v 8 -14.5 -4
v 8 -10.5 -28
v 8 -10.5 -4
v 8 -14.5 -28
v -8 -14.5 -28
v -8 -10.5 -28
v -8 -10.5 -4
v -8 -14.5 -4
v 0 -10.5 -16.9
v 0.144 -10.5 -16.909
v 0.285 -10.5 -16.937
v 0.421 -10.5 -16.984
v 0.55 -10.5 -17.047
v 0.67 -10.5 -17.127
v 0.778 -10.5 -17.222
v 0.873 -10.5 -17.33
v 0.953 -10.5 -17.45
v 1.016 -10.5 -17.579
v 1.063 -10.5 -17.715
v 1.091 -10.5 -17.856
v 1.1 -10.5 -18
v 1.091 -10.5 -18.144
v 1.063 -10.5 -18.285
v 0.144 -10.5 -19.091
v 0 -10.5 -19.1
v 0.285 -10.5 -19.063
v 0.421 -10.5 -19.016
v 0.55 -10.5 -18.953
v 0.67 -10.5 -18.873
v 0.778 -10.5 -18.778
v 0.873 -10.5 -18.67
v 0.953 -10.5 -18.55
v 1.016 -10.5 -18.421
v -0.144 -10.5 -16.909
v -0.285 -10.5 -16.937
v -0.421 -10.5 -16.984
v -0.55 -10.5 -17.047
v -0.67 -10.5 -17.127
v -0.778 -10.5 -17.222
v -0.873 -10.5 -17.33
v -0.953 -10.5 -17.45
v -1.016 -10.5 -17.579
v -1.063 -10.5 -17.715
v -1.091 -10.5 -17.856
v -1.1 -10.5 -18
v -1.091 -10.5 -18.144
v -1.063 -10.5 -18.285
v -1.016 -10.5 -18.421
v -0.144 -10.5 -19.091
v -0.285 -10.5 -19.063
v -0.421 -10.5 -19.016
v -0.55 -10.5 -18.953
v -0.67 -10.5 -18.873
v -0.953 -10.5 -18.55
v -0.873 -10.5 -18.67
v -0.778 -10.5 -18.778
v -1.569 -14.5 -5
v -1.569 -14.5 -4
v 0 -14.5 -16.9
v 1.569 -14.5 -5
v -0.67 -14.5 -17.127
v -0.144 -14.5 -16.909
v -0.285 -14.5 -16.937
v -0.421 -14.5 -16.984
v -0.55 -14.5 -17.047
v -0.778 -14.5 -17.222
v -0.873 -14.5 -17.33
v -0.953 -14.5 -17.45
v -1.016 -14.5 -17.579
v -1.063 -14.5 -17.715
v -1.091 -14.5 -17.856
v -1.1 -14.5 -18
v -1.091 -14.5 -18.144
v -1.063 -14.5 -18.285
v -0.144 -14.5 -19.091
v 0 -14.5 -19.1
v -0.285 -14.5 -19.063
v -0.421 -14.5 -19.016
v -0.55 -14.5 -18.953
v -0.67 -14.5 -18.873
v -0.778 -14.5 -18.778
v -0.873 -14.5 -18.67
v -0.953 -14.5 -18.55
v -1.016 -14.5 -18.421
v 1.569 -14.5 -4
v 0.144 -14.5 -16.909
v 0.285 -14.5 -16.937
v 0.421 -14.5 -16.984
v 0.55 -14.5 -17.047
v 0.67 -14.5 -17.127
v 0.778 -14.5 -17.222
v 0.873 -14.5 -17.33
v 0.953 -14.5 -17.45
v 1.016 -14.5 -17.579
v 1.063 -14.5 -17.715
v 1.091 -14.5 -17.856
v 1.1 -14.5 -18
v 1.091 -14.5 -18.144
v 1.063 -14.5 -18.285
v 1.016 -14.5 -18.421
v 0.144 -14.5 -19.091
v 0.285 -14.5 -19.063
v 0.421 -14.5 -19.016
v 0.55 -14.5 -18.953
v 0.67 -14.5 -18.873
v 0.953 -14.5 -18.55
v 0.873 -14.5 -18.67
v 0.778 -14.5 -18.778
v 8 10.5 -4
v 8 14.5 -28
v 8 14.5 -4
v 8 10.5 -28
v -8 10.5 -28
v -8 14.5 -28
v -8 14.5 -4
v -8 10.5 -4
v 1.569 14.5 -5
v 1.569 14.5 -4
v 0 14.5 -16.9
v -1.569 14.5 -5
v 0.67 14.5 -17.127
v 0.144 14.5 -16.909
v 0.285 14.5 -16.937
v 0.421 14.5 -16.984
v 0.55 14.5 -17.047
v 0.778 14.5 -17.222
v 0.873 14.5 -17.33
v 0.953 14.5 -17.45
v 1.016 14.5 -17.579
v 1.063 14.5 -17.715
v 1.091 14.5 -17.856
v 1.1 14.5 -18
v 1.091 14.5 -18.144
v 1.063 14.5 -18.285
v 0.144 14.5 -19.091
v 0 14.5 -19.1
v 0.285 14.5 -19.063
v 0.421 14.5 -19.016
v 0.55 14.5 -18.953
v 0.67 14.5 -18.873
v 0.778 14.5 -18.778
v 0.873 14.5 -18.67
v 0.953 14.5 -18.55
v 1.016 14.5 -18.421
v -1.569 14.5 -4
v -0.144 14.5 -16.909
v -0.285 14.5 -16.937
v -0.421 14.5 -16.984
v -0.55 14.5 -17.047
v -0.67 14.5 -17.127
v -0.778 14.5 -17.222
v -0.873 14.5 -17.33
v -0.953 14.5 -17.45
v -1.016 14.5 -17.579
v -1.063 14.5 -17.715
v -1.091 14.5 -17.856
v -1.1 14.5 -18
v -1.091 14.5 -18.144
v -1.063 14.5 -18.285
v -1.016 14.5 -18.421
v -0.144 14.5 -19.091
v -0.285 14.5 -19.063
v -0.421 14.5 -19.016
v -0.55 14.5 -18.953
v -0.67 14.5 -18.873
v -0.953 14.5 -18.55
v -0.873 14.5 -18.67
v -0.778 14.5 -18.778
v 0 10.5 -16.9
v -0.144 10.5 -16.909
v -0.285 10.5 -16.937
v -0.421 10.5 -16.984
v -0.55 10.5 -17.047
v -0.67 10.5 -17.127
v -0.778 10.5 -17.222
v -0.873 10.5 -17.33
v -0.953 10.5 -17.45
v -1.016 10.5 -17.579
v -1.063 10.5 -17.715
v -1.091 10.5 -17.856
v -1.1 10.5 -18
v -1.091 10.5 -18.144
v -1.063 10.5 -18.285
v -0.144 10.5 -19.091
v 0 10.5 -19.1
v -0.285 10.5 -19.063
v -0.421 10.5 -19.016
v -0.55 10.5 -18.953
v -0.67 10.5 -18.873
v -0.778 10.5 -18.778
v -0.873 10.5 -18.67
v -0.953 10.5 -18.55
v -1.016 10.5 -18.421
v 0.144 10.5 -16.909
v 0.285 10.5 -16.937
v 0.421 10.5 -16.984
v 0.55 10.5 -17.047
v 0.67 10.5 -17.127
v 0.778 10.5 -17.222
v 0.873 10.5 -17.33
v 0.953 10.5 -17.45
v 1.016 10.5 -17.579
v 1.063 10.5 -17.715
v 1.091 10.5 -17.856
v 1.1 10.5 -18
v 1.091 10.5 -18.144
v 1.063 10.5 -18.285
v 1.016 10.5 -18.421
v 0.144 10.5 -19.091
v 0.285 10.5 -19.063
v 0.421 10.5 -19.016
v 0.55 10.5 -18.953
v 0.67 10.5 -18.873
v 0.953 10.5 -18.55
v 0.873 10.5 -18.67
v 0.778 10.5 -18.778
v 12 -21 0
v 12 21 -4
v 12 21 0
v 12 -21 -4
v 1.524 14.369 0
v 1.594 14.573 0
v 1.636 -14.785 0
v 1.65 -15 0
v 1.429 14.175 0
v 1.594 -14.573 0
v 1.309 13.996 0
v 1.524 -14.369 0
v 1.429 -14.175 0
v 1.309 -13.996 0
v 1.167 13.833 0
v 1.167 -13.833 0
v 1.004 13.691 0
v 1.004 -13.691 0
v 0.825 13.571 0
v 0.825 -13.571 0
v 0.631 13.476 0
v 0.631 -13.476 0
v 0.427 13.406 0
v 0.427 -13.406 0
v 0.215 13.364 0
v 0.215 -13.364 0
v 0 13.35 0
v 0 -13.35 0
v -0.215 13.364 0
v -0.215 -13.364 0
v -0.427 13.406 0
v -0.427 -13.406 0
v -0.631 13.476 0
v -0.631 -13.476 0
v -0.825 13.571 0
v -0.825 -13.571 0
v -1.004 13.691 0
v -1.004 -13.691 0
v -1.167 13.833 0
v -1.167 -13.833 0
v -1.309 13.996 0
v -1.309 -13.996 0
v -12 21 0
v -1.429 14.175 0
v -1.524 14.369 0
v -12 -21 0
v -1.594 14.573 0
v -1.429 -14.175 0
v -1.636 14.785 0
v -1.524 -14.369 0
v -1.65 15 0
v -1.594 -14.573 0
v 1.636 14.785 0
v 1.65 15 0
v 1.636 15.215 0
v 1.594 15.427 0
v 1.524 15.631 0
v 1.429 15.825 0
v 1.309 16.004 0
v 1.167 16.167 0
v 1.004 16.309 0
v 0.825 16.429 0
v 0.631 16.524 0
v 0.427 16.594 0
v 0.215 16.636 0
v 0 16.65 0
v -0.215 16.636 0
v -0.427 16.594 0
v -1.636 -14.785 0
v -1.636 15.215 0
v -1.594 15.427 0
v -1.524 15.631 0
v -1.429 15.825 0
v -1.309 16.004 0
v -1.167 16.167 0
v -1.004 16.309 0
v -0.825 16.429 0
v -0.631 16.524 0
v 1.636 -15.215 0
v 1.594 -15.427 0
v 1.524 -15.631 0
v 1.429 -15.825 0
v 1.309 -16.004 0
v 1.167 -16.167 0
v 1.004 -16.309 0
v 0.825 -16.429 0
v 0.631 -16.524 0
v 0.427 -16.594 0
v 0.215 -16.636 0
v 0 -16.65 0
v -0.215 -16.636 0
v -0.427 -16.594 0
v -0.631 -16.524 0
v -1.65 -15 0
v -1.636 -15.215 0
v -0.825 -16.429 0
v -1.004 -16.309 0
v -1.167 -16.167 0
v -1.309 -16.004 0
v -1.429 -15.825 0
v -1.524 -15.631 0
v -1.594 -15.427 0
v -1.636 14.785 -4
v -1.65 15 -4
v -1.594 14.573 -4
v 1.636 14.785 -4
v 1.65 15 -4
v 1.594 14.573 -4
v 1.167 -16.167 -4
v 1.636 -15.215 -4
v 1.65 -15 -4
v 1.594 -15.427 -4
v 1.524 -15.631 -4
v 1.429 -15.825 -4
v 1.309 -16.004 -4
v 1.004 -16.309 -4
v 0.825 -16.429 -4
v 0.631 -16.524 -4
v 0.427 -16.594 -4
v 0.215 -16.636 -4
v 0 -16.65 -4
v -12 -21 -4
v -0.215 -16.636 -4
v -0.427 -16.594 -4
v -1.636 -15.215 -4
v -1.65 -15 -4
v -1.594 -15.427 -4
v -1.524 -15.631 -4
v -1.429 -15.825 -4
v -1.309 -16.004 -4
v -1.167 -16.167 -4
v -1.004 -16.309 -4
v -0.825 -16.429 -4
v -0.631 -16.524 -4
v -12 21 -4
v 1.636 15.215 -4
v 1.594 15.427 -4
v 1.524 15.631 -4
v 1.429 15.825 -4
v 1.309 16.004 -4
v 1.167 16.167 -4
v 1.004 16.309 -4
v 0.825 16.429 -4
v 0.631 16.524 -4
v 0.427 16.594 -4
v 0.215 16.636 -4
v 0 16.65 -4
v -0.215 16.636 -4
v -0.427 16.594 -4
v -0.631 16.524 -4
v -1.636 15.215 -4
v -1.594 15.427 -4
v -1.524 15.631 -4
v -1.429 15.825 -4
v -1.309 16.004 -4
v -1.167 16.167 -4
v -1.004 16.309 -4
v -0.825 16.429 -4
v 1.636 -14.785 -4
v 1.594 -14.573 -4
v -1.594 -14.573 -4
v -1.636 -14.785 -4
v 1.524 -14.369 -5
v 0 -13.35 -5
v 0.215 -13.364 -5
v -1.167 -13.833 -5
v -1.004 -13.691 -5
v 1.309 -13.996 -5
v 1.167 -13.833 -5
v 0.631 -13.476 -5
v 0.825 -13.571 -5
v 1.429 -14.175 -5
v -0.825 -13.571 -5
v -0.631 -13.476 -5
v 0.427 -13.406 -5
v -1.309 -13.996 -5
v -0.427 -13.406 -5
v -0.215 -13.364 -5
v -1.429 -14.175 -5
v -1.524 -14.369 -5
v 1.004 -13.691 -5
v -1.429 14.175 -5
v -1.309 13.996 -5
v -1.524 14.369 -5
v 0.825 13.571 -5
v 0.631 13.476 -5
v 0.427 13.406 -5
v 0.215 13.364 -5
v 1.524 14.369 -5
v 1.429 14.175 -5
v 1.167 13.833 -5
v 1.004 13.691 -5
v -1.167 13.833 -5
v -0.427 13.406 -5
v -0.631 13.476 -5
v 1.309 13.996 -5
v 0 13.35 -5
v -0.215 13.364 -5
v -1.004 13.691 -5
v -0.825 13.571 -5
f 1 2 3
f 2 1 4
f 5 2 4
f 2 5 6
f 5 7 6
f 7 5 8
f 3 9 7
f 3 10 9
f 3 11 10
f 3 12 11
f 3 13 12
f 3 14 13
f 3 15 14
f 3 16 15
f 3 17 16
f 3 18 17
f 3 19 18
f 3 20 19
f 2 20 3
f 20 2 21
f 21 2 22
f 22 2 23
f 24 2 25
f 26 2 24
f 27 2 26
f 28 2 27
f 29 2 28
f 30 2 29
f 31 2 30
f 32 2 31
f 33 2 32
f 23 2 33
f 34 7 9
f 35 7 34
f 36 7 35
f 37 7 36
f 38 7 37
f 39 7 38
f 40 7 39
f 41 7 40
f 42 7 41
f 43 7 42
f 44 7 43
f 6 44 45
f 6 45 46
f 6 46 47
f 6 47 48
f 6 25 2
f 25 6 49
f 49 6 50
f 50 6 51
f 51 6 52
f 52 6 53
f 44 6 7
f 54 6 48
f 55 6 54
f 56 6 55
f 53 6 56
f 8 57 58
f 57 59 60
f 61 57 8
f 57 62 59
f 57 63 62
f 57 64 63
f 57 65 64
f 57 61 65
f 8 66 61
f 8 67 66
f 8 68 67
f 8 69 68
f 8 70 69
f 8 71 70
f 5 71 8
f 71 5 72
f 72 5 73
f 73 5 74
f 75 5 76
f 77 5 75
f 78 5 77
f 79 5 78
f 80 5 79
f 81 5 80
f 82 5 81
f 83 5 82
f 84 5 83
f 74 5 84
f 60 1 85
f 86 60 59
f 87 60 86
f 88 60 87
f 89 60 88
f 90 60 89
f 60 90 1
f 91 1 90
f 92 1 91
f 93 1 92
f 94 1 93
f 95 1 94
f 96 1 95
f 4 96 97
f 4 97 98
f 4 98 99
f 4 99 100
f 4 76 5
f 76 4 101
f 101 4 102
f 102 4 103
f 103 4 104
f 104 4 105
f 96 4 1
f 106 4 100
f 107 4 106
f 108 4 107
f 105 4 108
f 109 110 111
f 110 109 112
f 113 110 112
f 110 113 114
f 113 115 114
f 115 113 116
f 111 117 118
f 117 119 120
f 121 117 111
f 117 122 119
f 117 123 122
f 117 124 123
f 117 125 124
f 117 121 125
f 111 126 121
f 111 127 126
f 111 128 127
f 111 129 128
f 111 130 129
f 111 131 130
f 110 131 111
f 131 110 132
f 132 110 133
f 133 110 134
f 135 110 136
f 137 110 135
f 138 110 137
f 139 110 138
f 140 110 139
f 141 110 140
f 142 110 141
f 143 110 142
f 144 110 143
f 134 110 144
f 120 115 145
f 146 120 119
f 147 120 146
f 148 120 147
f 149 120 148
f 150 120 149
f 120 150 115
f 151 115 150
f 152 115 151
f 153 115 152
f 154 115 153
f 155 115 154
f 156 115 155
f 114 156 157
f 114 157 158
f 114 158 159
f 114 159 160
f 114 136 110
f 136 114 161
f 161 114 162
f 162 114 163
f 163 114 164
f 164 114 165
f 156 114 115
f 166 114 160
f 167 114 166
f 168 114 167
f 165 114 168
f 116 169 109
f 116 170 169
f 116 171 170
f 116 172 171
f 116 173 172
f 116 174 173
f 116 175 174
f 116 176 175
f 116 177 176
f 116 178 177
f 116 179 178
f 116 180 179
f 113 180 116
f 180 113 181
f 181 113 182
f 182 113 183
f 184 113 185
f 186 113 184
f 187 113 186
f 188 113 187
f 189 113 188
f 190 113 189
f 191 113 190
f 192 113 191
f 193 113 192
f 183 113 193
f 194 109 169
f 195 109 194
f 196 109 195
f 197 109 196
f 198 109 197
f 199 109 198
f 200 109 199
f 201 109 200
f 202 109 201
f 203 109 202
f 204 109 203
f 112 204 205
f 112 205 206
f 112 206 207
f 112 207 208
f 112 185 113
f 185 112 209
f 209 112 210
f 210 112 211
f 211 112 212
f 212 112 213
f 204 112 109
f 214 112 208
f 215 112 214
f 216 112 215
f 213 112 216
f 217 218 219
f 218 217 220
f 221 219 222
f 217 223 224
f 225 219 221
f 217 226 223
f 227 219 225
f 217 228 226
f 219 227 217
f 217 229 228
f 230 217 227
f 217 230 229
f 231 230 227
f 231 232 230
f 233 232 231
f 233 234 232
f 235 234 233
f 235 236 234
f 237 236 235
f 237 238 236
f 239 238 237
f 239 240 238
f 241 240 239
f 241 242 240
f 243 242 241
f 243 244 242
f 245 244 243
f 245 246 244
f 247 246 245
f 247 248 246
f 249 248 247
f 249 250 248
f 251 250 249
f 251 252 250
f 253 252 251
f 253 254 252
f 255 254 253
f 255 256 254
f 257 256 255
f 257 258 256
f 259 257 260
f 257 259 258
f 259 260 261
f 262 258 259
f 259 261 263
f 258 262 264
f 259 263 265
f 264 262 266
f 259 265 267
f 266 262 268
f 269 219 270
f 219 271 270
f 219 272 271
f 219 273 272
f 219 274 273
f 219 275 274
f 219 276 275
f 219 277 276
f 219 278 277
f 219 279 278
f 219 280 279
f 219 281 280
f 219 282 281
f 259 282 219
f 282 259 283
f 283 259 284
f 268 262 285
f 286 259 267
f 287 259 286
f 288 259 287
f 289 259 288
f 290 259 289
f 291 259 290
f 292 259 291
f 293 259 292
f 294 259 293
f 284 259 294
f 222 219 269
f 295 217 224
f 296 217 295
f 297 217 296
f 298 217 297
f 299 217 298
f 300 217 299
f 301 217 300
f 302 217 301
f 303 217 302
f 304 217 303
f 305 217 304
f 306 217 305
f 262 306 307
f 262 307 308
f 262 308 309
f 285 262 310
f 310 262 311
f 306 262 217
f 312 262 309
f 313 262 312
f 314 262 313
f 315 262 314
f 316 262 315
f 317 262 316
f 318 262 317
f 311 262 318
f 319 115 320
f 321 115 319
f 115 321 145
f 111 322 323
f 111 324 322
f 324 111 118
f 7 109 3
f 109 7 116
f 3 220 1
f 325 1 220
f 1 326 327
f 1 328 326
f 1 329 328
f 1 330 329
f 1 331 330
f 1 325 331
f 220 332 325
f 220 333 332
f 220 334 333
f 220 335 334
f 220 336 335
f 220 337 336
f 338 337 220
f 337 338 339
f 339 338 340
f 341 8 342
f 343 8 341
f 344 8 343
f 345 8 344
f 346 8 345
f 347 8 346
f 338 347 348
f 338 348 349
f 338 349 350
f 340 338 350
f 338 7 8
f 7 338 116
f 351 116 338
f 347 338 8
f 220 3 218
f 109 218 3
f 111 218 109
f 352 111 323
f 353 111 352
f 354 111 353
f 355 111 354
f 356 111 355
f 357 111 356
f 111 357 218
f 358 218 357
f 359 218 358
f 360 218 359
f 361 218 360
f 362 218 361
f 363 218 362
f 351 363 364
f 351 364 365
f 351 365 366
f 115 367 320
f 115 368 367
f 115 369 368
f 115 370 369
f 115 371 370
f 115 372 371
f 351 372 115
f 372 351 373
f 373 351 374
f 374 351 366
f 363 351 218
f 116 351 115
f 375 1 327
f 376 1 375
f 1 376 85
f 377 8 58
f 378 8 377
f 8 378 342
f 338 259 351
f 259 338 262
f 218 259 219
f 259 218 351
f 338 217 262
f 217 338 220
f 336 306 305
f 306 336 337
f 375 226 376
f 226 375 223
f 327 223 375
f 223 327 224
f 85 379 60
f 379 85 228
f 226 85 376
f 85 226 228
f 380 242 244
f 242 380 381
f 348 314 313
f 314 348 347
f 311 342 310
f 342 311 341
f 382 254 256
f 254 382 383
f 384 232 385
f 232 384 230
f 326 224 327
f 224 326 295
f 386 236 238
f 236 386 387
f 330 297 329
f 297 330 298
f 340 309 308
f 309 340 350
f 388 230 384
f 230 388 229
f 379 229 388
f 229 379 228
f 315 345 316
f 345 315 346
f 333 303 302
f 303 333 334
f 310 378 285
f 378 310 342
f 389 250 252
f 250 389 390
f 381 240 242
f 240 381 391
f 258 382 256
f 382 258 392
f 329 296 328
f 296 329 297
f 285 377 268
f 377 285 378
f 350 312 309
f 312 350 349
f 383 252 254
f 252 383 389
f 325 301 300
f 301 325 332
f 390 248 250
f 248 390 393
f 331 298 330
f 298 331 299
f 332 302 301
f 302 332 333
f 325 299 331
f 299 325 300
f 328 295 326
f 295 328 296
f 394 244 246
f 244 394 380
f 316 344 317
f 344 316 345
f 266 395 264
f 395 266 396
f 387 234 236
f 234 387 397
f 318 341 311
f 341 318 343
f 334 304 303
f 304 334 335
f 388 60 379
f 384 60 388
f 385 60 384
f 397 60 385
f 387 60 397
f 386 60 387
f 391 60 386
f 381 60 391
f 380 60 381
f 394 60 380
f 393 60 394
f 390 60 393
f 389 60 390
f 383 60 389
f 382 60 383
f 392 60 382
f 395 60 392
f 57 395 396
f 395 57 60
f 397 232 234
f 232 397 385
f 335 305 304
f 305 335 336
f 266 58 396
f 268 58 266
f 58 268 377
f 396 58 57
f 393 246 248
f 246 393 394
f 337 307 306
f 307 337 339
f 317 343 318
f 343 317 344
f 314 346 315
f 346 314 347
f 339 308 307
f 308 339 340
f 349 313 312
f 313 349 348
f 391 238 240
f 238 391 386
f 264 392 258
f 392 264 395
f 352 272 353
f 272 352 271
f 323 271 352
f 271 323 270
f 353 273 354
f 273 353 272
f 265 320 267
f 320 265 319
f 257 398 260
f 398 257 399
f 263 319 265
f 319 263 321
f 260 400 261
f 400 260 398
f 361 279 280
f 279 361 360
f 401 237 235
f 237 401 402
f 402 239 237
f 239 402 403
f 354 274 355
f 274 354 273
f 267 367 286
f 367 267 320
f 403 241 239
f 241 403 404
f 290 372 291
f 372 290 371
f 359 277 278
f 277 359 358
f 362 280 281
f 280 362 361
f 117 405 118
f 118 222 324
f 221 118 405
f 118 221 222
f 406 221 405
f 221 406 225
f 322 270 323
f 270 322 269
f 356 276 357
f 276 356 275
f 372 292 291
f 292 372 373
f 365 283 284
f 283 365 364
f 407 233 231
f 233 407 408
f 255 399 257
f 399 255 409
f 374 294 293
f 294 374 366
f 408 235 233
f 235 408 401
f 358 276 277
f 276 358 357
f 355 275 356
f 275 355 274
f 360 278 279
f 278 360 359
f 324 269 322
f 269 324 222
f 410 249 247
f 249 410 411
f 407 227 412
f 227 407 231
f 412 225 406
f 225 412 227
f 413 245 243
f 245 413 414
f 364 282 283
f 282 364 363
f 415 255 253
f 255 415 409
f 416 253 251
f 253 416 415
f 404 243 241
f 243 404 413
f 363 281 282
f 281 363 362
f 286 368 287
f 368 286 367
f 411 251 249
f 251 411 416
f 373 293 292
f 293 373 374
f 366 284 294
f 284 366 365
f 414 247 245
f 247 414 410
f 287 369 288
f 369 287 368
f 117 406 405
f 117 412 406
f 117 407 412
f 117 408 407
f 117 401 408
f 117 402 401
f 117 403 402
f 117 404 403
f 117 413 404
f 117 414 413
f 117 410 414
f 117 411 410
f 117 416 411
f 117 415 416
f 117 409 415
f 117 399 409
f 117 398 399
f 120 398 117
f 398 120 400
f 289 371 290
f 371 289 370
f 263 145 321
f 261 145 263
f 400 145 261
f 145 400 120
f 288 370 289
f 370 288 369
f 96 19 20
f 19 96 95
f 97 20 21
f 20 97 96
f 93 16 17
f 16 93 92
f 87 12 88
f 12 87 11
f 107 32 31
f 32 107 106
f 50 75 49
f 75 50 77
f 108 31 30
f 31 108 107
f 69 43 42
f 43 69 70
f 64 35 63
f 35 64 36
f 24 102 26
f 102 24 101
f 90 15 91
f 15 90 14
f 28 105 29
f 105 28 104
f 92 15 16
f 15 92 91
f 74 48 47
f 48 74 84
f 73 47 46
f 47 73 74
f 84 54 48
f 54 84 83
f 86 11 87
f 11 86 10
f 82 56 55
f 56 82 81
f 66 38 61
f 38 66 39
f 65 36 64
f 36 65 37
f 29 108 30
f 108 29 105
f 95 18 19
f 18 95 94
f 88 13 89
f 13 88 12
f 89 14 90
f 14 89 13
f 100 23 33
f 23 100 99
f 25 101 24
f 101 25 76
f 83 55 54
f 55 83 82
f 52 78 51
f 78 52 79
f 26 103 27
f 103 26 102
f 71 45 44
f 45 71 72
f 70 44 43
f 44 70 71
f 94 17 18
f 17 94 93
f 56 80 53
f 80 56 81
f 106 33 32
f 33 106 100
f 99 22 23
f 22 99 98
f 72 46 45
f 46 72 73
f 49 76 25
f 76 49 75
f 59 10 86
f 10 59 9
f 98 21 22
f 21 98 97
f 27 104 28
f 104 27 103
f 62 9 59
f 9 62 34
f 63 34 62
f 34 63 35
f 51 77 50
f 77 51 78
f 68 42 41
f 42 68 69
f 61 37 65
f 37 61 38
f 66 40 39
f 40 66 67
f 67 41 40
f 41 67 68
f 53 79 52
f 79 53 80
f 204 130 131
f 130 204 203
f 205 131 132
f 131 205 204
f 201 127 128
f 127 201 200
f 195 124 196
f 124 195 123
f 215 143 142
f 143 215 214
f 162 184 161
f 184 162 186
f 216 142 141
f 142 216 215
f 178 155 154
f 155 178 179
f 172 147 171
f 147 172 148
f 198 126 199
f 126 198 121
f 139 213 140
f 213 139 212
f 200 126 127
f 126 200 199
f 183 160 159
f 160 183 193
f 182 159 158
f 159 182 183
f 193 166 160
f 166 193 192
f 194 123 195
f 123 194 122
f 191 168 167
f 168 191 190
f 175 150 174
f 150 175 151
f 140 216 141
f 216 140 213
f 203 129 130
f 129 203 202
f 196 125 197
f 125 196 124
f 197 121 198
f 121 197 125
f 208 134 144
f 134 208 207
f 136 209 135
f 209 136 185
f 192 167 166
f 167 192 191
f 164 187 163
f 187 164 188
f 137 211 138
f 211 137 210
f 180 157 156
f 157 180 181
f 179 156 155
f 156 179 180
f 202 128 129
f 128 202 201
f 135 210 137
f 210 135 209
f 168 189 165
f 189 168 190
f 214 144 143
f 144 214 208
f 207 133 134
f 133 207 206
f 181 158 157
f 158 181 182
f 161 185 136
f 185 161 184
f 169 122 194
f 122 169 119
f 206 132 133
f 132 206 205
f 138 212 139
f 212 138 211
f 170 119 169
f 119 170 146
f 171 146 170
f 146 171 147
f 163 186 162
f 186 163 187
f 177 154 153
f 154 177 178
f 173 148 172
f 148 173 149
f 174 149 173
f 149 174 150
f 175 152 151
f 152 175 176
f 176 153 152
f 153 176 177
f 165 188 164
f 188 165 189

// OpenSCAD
// file: ../common/ds_lib.scad
// DronSwarm · librería común de piezas del frame (S07-S08). Unidades: mm.
//
// Reglas (ADR-003): sin hull()/minkowski()/offset() — FreeCAD los convierte en malla y el STEP deja de ser un
// sólido válido. Las formas redondeadas se arman con uniones de cubos y cilindros. El importador CSG de FreeCAD
// también falla con booleanas 2D y con varios operandos agrupados bajo una sola transformación: cada grupo de
// agujeros debe ser hijo directo del difference(), con su propio translate.
//
// Interfaz de motor DronSwarm (DMI, ADR-011): placa con 4 ranuras radiales a 90°, de modo que el mismo soporte
// acepta varios patrones comerciales y, más adelante, el motor propio (S17+) se diseña para caer en el mismo rango.
//   DMI-S: 4×M3, círculo de tornillos Ø16-Ø25 (motores 28xx-41xx, ≤ 600 W)
//   DMI-L: 4×M4, círculo de tornillos Ø30-Ø42 (motores 50xx-70xx, ≤ 2 kW)

$fn = 48;

M3 = 3.3; M3_HEAD = 6.0; M3_NUT = 6.4;     // pasante, cabeza, tuerca (entre caras + juego)
M4 = 4.4; M4_HEAD = 7.5;
M5 = 5.4;

function dmi_bolt(iface) = iface == "L" ? M4 : M3;
function dmi_r(iface) = iface == "L" ? [15, 21] : [8, 12.5];   // radio mínimo y máximo de las ranuras
function dmi_plate_d(iface) = iface == "L" ? 56 : 36;
function dmi_center(iface) = iface == "L" ? 16 : 10;            // eje, seguro y paso de cables

// Rectángulo con esquinas redondeadas (2D) y su extrusión
module rrect2d(size, r) {
    r2 = min(r, size[0] / 2 - 0.01, size[1] / 2 - 0.01);
    union() {
        translate([r2, 0]) square([size[0] - 2 * r2, size[1]]);
        translate([0, r2]) square([size[0], size[1] - 2 * r2]);
        for (x = [r2, size[0] - r2], y = [r2, size[1] - r2]) translate([x, y]) circle(r = r2);
    }
}
// Caja redondeada con primitivas 3D (sin booleanas 2D: el importador CSG de FreeCAD falla con ellas)
module rbox(size, r) {
    r2 = min(r, size[0] / 2 - 0.01, size[1] / 2 - 0.01);
    union() {
        translate([r2, 0, 0]) cube([size[0] - 2 * r2, size[1], size[2]]);
        translate([0, r2, 0]) cube([size[0], size[1] - 2 * r2, size[2]]);
        for (x = [r2, size[0] - r2], y = [r2, size[1] - r2]) translate([x, y, 0]) cylinder(r = r2, h = size[2]);
    }
}
module crbox(size, r) { translate([-size[0] / 2, -size[1] / 2, 0]) rbox(size, r); }   // centrado en x/y

// Ranura (2D) entre dos puntos sobre el eje x
module slot2d(r0, r1, w) {
    union() {
        translate([r0, -w / 2]) square([r1 - r0, w]);
        translate([r0, 0]) circle(d = w);
        translate([r1, 0]) circle(d = w);
    }
}

// Agujeros de la interfaz de motor (para restar de una placa de espesor t)
module slot3d(r0, r1, w, h) {
    union() {
        translate([r0, -w / 2, 0]) cube([r1 - r0, w, h]);
        translate([r0, 0, 0]) cylinder(d = w, h = h);
        translate([r1, 0, 0]) cylinder(d = w, h = h);
    }
}
module dmi_holes(iface, t) {
    r = dmi_r(iface);
    translate([0, 0, -1]) union() {
        cylinder(d = dmi_center(iface), h = t + 2);
        for (a = [45, 135, 225, 315]) rotate(a) slot3d(r[0], r[1], dmi_bolt(iface), t + 2);
    }
}

// Soporte de motor en la punta del brazo: manguito sobre el tubo + placa DMI arriba
//   el tubo entra por -x; la placa queda centrada en el eje del motor (origen), cara superior en z = 0
module motor_mount(tube_d, iface = "S", sleeve = 34, wall = 3.5) {
    od = tube_d + 2 * wall;
    pd = dmi_plate_d(iface);
    pt = iface == "L" ? 6 : 4;
    zc = -pt - tube_d / 2 - 1;                 // eje del tubo bajo la placa
    difference() {
        union() {
            translate([0, 0, -pt]) cylinder(d = pd, h = pt);                         // placa DMI
            translate([-sleeve - pd / 2 + 6, 0, zc]) rotate([0, 90, 0])
                cylinder(d = od, h = sleeve + pd / 2 - 6 + 4);                       // manguito
            translate([-sleeve - pd / 2 + 6, -od / 2, zc]) cube([sleeve + pd / 2 - 2, od, -zc - pt + 0.01]);  // alma
            translate([-sleeve - pd / 2 + 6, -5, zc - od / 2 - 7]) cube([sleeve, 10, 8]);   // oreja de apriete
        }
        dmi_holes(iface, pt + 0.02, $fn = 32);
        translate([-sleeve - pd / 2 + 5, 0, zc]) rotate([0, 90, 0]) cylinder(d = tube_d + 0.3, h = sleeve + pd / 2 - 3); // tubo
        translate([-sleeve - pd / 2 + 4, -1, zc - od / 2 - 8]) cube([sleeve + 1, 2, od / 2 + 6]);   // ranura de apriete
        for (x = [0.3, 0.75]) translate([-sleeve - pd / 2 + 6 + x * sleeve, 0, zc - od / 2 - 3])
            rotate([90, 0, 0]) cylinder(d = M3, h = 30, center = true);                // tornillos de apriete
        translate([-pd / 2 - 2, 0, zc]) rotate([0, 90, 0]) cylinder(d = 7, h = pd);   // salida de cables del tubo
    }
}

// Bloque de brazo entre las dos placas centrales (impreso PA12-CF): sujeta el tubo y separa las placas.
//   el tubo sale por +x desde el origen; el bloque ocupa x ∈ [-len, 0], altura = gap
module arm_block(tube_d, gap, len = 40, width = 0, bolt = M3) {
    w = width > 0 ? width : tube_d + 14;
    difference() {
        translate([-len, -w / 2, 0]) rbox([len, w, gap], 2);
        translate([-len - 1, 0, gap / 2]) rotate([0, 90, 0]) cylinder(d = tube_d + 0.2, h = len + 2);   // tubo
        translate([-len - 1, -0.75, gap / 2]) cube([len + 2, 1.5, gap / 2 + 1]);                        // ranura de apriete
        for (p = arm_block_bolts(tube_d, len, w)) translate([p[0], p[1], -1]) cylinder(d = bolt, h = gap + 2);
        translate([-len * 0.5, 0, gap * 0.78]) rotate([90, 0, 0]) cylinder(d = M3, h = w + 2, center = true);  // apriete
    }
}
function arm_block_bolts(tube_d, len, w) =
    [for (x = [-len + 6, -6], y = [-(w / 2 - 3.6), w / 2 - 3.6]) [x, y]];

// Patrón de controladora de vuelo (agujeros M3 en cuadrado)
module fc_holes(pattern, t) {
    for (x = [-1, 1], y = [-1, 1]) translate([x * pattern / 2, y * pattern / 2, -1]) cylinder(d = M3, h = t + 2);
}
// file: ds_d_params.scad
// DS-D · parámetros generados por tools/cad/gen_cad_params.py el 2026-10-19
// desde engineering/data/results (spec v1). No editar a mano: regenerar. Unidades: mm, kg.

vehicle = "DS-D";
rotors = 6;
wheelbase = 1453;
arm_radius = 726.5;
prop_d = 660.4;
tube_od = 22;
tube_wall = 1.5;
arm_len = 545;
plate_d = 363.2;
plate_t = 3;
plate_gap = 28;
motor_iface = "L";
battery_dims = [220, 134.4, 76.2];
battery = "12S5P P42A";
leg_h = 420;
fold_arms = true;
mtow_kg = 15.61;
motor_mass_kg = 0.345;
fc_pattern = 30.5;
payload_box = [300, 240, 220];
payload_kg = 5;
// file: ds_d_frame.scad
// DS-D · geometría compartida del frame: posiciones derivadas de los parámetros (spec v1). Unidades: mm.
// Ejes: x adelante, y izquierda, z arriba. z = 0 es la cara superior de la placa inferior.
// Hexa con brazos desmontables (bloques con levas entre las placas, ADR-012), batería y carcasa arriba,
// mecanismo de liberación de la carga al centro abajo, tren de esquíes.

include <ds_d_params.scad>
use <../common/ds_lib.scad>
include <../common/ds_lib.scad>

arm_angles = [0, 60, 120, 180, 240, 300];      // igual que el SDF/PX4 (rotor 0 adelante)
// Brazos desmontables (ADR-012): el tubo entra en un bloque impreso entre las placas y se fija con 2 levas de
// apriete rápido; los cables del motor tienen un conector en el bloque. Se monta/desmonta sin herramientas.
block_len = 60;
block_w = tube_od + 20;
r_block_out = plate_d / 2 - 3;                  // cara exterior del bloque
tube_insert = 54;                               // el tubo entra hasta un tope interior
tube_z = plate_gap / 2;
tube_start = r_block_out - tube_insert;
tube_len = arm_radius - tube_start - 6;
mm_sleeve = 30;

// Arriba: batería transversal atrás y carcasa adelante. Abajo: liberación al centro, FPV adelante
battery_pos = [-60, 0];
housing_size = [130, 110, 62];
housing_pos = [90, 0];
housing_flange = 10;
housing_bolts = [for (x = [-1, 0, 1], y = [-1, 1]) [housing_pos[0] + x * (housing_size[0] / 2 + 6), y * (housing_size[1] / 2 + 6)]];   // fuera del canal de la junta
battery_tray_bolts = [for (x = [-1, 1], y = [-1, 1]) [battery_pos[0] + x * 50, y * 95]];
release_bolts = [for (x = [-1, 1], y = [-1, 1]) [x * 35, y * 20]];
cable_gland_pos = [housing_pos[0] - housing_size[0] / 2 + 20, 0];
fpv_pos = [plate_d / 2 - 30, 0];

// Tren de esquíes: 4 patas inclinadas desde la placa inferior hasta dos esquíes longitudinales (base ancha)
leg_x = 100;                                    // patas en x = ±leg_x
leg_y_top = 110;                                // arriba, bajo la placa
skid_y = 220;                                   // esquíes en y = ±skid_y
skid_len = 560;
gear_tube = 16;                                 // tubos Ø16×1
gear_wall = 1.0;
ground_z = -leg_h;
skid_z = ground_z + gear_tube / 2 + 6;          // eje del esquí (sobre su zapata de TPU de 6 mm)
gear_mount_h = 30;                              // soporte impreso bajo la placa
// pivotes: el del soporte (bajo la placa) y el de la T (eje del esquí); la pata va de uno a otro
pivot_top = [leg_y_top, -plate_t - 6];
pivot_bot = [skid_y, skid_z];
leg_dy = pivot_bot[0] - pivot_top[0];
leg_dz = pivot_top[1] - pivot_bot[1];
leg_tilt = atan(leg_dy / leg_dz);               // inclinación hacia afuera (en torno a x)
leg_in_top = 4;                                 // el tubo termina 4 mm antes del pivote del soporte
leg_in_bot = 10;                                // y 10 mm después del eje del esquí
leg_len = sqrt(leg_dy * leg_dy + leg_dz * leg_dz) - leg_in_top - leg_in_bot;
gear_mount_bolts = [for (sx = [-1, 1], sy = [-1, 1], d = [[-14, -10], [14, -10], [-14, 10], [14, 10]]) [sx * leg_x + d[0], sy * leg_y_top + d[1]]];

motor_d = motor_iface == "L" ? 62 : 38;
motor_h = motor_iface == "L" ? 36 : 26;
function block_bolts() = [for (x = [-block_len + 7, -block_len / 2, -7], y = [-1, 1]) [x, y * (block_w / 2 - 4.5)]];
// main file
// DS-D · soporte de cámara FPV (impreso PA12-CF): cámara de 19 mm inclinada 20° hacia abajo, adelante bajo la placa.
// Local: cara contra la placa en z = 0, centrado en fpv_pos.
include <ds_d_frame.scad>
module fpv_mount() difference() {
    union() {
        translate([-12, -21, -4]) cube([24, 42, 4]);
        for (y = [-1, 1]) translate([-8, y * 12.5 - 2, -28]) cube([16, 4, 26]);
    }
    for (y = [-1, 1]) translate([0, y * 15, -5]) cylinder(d = M3, h = 6);
    for (y = [-1, 1]) translate([0, y * 12.5, -18]) rotate([90, 0, 0]) cylinder(d = 2.2, h = 8, center = true);   // M2 de la cámara
}
fpv_mount();
